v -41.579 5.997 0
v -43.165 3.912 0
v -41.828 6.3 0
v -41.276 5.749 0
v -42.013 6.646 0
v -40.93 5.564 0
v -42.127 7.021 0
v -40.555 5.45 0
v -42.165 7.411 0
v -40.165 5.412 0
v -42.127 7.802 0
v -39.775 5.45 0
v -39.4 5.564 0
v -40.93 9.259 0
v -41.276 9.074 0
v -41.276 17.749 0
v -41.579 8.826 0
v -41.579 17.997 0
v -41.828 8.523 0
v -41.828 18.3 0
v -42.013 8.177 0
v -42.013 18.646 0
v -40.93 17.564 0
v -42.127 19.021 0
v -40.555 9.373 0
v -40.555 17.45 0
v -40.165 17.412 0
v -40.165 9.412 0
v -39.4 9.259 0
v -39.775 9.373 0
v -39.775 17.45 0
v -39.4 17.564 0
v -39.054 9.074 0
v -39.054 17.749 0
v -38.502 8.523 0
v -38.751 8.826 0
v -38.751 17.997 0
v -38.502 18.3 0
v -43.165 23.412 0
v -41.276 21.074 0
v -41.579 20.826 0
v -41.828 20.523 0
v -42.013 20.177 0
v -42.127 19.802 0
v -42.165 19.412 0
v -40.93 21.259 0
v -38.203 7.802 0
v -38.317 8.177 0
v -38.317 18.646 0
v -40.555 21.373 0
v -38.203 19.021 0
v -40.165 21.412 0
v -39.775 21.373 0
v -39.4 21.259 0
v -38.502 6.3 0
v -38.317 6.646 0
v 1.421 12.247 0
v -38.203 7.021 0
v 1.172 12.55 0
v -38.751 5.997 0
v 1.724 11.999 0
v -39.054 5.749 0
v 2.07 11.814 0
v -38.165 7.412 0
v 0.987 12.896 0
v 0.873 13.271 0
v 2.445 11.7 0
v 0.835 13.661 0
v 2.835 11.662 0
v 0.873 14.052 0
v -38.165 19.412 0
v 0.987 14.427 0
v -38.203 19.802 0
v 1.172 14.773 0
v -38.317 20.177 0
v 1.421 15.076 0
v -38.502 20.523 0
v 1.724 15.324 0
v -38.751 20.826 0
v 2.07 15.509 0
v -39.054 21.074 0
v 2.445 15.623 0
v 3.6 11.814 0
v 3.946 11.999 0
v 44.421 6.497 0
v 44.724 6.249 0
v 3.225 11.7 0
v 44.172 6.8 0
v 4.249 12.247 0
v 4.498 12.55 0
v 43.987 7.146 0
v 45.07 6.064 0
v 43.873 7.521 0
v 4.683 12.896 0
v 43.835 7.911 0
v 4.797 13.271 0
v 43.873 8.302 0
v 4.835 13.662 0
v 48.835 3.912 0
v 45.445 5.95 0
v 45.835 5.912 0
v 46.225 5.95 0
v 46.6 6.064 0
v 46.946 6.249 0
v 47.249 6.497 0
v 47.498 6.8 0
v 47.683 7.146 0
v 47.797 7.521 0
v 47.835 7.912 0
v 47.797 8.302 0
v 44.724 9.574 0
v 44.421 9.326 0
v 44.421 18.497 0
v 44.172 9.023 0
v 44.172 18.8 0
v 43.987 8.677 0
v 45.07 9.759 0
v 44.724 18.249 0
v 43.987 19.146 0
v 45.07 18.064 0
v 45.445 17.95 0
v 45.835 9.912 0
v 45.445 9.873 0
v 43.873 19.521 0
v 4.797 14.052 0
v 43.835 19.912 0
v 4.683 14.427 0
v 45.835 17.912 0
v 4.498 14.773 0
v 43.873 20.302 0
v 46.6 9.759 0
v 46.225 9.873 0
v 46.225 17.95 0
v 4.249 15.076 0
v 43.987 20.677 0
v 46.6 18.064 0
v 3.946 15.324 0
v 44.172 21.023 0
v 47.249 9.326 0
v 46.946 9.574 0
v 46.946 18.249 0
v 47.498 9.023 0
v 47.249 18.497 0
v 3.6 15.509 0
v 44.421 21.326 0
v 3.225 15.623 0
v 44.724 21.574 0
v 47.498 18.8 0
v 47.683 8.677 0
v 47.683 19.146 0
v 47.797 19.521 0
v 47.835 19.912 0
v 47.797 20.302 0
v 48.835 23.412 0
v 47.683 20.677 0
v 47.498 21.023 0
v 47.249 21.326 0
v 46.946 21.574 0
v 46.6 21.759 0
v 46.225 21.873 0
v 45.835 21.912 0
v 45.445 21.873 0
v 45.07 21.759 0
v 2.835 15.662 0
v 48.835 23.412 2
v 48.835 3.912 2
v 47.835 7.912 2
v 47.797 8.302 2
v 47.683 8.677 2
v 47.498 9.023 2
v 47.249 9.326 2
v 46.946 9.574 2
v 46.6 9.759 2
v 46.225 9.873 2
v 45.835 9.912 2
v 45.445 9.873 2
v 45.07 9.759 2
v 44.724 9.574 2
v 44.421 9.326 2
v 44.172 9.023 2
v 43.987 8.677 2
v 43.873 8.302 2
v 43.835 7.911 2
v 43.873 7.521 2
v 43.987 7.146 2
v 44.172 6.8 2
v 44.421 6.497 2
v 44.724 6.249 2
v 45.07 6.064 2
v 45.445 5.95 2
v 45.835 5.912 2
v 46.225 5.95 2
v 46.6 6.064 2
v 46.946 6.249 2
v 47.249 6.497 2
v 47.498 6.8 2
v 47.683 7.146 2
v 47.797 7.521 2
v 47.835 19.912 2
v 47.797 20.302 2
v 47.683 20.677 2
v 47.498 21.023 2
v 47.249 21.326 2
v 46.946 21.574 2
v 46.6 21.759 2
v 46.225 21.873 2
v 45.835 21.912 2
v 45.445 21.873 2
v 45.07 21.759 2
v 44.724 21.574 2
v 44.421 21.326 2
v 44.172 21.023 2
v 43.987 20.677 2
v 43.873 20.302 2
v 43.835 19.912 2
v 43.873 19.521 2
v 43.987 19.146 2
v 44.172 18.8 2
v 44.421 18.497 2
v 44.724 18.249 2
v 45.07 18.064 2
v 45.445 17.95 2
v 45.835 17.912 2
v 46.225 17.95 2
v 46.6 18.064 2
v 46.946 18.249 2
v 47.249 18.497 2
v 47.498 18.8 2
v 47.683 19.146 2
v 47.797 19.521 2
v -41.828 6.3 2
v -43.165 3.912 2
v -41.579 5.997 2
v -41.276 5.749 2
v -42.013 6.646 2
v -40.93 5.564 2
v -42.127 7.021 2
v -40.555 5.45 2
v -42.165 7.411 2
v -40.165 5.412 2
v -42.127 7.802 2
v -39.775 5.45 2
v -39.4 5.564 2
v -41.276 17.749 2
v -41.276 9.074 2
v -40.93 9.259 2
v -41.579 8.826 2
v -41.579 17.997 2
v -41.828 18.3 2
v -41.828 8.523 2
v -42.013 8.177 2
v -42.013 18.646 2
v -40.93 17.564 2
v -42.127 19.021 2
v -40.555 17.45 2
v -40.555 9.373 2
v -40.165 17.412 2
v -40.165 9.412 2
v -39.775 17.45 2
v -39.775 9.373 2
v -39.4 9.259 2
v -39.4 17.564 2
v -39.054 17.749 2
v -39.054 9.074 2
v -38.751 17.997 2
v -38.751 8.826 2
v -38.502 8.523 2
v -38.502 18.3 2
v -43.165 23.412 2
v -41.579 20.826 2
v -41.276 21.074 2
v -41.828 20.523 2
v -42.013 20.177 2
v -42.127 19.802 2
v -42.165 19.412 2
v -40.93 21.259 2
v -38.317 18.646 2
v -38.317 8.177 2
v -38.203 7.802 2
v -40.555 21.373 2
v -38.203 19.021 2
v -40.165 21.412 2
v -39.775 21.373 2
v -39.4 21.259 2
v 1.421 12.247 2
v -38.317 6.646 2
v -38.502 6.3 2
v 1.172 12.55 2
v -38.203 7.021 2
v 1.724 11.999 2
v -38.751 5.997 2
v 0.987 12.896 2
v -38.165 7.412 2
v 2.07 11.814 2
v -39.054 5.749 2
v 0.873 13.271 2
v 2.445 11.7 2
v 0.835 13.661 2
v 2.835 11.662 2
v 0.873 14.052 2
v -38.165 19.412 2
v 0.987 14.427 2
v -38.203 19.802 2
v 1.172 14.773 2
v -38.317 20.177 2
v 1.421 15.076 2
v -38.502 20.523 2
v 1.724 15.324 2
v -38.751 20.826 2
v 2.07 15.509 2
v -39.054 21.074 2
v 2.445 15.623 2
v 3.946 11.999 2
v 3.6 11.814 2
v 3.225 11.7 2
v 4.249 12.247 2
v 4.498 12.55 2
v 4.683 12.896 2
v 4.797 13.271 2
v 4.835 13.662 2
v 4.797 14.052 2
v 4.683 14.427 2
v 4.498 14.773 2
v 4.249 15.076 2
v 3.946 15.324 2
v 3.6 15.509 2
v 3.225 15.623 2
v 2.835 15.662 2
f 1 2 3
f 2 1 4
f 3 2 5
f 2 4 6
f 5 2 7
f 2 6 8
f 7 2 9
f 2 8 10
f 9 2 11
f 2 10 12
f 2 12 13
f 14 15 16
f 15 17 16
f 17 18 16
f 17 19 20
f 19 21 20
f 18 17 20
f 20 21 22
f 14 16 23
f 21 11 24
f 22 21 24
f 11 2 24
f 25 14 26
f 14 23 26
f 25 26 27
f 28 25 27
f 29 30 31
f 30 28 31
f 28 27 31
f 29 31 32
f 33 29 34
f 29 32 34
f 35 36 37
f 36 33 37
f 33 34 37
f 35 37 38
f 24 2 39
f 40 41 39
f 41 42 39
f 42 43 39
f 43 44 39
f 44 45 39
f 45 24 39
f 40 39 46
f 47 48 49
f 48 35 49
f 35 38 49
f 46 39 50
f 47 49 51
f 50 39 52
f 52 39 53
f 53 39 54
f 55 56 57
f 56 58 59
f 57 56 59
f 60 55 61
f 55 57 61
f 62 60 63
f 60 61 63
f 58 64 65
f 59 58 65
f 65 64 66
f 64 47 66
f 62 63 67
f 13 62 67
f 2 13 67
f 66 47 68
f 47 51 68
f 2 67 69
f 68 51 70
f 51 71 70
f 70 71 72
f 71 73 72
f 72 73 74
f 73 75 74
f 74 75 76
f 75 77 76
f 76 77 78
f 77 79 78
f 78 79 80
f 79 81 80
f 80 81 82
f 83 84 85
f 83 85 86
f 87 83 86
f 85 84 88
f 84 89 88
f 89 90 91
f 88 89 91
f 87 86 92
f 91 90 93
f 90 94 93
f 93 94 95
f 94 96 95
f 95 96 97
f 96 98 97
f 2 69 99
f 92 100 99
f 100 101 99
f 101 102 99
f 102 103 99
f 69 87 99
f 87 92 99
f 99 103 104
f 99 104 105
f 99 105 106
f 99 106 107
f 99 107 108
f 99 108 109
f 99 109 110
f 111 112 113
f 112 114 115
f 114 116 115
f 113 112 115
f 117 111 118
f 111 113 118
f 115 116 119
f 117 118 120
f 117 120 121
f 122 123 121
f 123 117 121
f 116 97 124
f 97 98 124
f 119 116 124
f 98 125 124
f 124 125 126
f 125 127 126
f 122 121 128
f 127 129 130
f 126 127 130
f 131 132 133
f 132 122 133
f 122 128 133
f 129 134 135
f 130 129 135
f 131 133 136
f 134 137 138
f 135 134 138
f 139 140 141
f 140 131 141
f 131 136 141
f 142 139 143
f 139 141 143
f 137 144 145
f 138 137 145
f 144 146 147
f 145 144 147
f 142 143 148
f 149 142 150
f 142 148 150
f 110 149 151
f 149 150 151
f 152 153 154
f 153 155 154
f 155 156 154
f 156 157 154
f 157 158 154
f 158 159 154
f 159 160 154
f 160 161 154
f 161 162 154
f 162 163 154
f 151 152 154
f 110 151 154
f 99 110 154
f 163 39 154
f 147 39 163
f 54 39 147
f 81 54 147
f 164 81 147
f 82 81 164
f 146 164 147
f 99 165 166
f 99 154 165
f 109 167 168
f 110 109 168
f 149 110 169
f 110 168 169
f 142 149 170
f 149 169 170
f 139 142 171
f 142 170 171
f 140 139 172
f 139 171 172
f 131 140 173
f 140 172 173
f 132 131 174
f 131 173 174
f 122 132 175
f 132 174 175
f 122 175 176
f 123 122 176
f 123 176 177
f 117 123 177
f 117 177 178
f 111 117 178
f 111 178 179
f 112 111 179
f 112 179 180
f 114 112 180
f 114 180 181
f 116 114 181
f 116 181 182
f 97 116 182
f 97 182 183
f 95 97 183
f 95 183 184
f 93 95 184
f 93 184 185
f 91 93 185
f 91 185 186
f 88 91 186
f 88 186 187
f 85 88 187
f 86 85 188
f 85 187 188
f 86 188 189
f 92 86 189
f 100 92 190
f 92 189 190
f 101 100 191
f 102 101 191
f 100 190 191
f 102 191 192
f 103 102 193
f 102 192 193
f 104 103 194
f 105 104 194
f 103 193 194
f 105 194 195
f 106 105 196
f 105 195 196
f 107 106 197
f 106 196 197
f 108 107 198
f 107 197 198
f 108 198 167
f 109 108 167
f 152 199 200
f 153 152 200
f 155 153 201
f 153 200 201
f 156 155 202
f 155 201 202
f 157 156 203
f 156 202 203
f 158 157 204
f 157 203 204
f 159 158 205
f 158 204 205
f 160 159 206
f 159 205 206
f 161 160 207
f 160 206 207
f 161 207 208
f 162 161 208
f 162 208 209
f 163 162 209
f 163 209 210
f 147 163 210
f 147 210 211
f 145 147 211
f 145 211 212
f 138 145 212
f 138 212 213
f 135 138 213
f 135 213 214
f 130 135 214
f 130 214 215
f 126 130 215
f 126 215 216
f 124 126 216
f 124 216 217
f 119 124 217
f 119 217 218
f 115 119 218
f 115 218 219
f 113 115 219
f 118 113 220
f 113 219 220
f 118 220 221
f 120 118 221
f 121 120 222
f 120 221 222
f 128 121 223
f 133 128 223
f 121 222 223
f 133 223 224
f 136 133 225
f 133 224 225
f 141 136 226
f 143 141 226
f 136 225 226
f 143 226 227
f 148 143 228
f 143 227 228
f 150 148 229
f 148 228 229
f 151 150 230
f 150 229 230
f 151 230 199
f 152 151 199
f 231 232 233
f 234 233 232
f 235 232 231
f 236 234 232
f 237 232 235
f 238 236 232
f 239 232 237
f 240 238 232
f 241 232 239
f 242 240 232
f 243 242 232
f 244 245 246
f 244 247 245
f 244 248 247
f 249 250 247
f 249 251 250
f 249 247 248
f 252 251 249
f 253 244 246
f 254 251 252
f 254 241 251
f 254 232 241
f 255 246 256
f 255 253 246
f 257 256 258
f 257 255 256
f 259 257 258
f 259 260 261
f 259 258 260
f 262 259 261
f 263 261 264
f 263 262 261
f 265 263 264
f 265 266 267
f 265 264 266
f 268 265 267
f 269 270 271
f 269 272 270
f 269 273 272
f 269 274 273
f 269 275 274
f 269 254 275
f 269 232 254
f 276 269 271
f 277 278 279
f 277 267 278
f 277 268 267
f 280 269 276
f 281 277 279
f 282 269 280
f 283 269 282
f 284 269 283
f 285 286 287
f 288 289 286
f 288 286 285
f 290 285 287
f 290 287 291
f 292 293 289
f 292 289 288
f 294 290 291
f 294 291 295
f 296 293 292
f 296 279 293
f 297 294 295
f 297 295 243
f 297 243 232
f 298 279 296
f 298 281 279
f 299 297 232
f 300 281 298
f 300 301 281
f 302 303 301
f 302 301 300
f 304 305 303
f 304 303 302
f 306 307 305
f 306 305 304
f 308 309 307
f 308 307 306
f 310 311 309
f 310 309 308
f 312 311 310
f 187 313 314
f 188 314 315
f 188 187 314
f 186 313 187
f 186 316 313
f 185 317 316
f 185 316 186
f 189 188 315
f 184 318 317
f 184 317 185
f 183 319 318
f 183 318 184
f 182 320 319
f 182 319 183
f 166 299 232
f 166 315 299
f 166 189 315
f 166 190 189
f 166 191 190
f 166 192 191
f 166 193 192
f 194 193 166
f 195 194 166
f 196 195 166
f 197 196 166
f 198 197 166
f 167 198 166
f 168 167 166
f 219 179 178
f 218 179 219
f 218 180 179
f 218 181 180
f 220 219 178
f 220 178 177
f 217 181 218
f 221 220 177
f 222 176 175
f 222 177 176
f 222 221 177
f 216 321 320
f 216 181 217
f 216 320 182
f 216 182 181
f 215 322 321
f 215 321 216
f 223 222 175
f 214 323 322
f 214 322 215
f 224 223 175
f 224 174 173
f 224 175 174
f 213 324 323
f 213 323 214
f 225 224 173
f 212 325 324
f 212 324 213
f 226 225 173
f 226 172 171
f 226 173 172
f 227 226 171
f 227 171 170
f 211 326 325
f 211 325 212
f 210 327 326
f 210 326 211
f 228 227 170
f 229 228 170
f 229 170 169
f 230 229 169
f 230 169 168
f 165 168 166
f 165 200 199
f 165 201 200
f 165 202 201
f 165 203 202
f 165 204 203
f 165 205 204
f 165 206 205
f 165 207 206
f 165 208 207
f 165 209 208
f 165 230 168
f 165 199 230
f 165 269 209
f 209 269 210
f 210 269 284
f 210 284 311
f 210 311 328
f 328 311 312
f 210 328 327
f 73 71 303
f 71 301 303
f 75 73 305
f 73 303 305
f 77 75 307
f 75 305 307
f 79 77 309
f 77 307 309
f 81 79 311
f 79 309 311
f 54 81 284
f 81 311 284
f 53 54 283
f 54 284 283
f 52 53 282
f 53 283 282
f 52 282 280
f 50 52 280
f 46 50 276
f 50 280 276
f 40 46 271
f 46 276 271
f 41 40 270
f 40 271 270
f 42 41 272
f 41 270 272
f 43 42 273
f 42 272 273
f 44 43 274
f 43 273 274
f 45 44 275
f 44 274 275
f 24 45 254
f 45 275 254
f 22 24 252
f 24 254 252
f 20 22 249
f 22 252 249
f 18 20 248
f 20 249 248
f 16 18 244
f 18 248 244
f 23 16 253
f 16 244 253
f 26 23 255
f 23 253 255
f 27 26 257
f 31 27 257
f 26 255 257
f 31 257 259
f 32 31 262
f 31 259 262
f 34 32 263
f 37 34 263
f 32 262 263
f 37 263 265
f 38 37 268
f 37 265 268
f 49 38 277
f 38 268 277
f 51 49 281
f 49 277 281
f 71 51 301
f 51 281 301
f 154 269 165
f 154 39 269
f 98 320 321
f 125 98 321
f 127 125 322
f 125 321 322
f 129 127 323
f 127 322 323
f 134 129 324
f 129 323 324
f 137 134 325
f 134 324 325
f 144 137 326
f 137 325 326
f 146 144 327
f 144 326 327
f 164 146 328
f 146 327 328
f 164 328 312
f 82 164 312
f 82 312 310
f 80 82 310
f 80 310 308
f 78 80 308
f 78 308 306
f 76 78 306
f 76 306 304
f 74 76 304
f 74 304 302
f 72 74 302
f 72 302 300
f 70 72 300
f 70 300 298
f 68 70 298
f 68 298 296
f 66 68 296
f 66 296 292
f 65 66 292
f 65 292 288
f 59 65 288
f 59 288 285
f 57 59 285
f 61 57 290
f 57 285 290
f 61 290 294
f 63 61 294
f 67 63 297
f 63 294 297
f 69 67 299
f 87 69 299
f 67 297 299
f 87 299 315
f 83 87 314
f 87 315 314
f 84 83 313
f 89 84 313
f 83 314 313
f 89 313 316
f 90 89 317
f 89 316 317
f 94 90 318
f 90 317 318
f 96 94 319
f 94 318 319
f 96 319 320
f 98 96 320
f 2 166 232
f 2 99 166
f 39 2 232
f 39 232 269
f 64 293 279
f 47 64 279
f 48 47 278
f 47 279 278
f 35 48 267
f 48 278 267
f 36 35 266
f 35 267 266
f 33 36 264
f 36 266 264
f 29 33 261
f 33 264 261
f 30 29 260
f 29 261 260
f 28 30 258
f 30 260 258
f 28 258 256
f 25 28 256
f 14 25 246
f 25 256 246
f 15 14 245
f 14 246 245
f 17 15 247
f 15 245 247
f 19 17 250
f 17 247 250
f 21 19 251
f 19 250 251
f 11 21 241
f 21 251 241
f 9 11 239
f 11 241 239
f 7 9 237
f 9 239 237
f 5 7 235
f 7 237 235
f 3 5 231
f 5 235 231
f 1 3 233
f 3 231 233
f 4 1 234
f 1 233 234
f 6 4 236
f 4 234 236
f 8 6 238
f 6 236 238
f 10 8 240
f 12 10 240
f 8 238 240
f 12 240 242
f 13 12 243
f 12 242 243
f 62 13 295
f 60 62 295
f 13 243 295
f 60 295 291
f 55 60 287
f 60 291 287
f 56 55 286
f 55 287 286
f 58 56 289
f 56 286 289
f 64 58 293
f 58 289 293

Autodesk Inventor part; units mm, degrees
ref_plane "YZ Plane" through (0, 0, 0) normal (1, 0, 0) x (0, 1, 0)
ref_plane "XZ Plane" through (0, 0, 0) normal (0, 1, 0) x (-1, 0, 0)
ref_plane "XY Plane" through (0, 0, 0) normal (0, 0, 1) x (1, 0, 0)
sketch "Эскиз1" plane through (0, 0, 0) normal (0, 0, 1) x (1, 0, 0)
  line L0 (-43.165, 23.4115) -> (48.835, 23.4115)
  line L1 (48.835, 23.4115) -> (48.835, 3.9115)
  line L2 (48.835, 3.9115) -> (-43.165, 3.9115)
  line L3 (-43.165, 3.9115) -> (-43.165, 23.4115)
  point P0 (0, 0)
  dimension "d0" = 92
  dimension "d1" = 19.5
extrude "Выдавливание1" add sketch "Эскиз1" along normal blind 2
sketch "Эскиз2" plane through (0, 0, 2) normal (0, 0, 1) x (1, 0, 0)
  circle A0 centre (-40.165, 7.4115) radius 2
  line L0 (-43.165, 23.4115) -> (-43.165, 3.9115) projected
  line L1 (-43.165, 3.9115) -> (48.835, 3.9115) projected
  circle A1 centre (-40.165, 19.4115) radius 2
  line L2 (48.835, 23.4115) -> (-43.165, 23.4115) projected
  circle A2 centre (45.835, 19.9115) radius 2
  line L3 (48.835, 3.9115) -> (48.835, 23.4115) projected
  circle A3 centre (45.835, 7.9115) radius 2
  circle A4 centre (2.835, 13.6615) radius 2
  point P0 (0, 0)
  dimension "d4" = 1
  dimension "d5" = 4
  dimension "d6" = 1.5
  dimension "d7" = 4
  dimension "d8" = 1
  dimension "d9" = 2
  dimension "d10" = 4
  dimension "d11" = 1
  dimension "d12" = 1.5
  dimension "d13" = 4
  dimension "d14" = 1
  dimension "d15" = 2
  dimension "d16" = 4
  dimension "d17" = 44
  dimension "d19" = 7.75
extrude "Выдавливание2" cut sketch "Эскиз2" against normal through all contours A0 | A1 | A2 | A3 | A4
properties part number "Пластинка шасси"
